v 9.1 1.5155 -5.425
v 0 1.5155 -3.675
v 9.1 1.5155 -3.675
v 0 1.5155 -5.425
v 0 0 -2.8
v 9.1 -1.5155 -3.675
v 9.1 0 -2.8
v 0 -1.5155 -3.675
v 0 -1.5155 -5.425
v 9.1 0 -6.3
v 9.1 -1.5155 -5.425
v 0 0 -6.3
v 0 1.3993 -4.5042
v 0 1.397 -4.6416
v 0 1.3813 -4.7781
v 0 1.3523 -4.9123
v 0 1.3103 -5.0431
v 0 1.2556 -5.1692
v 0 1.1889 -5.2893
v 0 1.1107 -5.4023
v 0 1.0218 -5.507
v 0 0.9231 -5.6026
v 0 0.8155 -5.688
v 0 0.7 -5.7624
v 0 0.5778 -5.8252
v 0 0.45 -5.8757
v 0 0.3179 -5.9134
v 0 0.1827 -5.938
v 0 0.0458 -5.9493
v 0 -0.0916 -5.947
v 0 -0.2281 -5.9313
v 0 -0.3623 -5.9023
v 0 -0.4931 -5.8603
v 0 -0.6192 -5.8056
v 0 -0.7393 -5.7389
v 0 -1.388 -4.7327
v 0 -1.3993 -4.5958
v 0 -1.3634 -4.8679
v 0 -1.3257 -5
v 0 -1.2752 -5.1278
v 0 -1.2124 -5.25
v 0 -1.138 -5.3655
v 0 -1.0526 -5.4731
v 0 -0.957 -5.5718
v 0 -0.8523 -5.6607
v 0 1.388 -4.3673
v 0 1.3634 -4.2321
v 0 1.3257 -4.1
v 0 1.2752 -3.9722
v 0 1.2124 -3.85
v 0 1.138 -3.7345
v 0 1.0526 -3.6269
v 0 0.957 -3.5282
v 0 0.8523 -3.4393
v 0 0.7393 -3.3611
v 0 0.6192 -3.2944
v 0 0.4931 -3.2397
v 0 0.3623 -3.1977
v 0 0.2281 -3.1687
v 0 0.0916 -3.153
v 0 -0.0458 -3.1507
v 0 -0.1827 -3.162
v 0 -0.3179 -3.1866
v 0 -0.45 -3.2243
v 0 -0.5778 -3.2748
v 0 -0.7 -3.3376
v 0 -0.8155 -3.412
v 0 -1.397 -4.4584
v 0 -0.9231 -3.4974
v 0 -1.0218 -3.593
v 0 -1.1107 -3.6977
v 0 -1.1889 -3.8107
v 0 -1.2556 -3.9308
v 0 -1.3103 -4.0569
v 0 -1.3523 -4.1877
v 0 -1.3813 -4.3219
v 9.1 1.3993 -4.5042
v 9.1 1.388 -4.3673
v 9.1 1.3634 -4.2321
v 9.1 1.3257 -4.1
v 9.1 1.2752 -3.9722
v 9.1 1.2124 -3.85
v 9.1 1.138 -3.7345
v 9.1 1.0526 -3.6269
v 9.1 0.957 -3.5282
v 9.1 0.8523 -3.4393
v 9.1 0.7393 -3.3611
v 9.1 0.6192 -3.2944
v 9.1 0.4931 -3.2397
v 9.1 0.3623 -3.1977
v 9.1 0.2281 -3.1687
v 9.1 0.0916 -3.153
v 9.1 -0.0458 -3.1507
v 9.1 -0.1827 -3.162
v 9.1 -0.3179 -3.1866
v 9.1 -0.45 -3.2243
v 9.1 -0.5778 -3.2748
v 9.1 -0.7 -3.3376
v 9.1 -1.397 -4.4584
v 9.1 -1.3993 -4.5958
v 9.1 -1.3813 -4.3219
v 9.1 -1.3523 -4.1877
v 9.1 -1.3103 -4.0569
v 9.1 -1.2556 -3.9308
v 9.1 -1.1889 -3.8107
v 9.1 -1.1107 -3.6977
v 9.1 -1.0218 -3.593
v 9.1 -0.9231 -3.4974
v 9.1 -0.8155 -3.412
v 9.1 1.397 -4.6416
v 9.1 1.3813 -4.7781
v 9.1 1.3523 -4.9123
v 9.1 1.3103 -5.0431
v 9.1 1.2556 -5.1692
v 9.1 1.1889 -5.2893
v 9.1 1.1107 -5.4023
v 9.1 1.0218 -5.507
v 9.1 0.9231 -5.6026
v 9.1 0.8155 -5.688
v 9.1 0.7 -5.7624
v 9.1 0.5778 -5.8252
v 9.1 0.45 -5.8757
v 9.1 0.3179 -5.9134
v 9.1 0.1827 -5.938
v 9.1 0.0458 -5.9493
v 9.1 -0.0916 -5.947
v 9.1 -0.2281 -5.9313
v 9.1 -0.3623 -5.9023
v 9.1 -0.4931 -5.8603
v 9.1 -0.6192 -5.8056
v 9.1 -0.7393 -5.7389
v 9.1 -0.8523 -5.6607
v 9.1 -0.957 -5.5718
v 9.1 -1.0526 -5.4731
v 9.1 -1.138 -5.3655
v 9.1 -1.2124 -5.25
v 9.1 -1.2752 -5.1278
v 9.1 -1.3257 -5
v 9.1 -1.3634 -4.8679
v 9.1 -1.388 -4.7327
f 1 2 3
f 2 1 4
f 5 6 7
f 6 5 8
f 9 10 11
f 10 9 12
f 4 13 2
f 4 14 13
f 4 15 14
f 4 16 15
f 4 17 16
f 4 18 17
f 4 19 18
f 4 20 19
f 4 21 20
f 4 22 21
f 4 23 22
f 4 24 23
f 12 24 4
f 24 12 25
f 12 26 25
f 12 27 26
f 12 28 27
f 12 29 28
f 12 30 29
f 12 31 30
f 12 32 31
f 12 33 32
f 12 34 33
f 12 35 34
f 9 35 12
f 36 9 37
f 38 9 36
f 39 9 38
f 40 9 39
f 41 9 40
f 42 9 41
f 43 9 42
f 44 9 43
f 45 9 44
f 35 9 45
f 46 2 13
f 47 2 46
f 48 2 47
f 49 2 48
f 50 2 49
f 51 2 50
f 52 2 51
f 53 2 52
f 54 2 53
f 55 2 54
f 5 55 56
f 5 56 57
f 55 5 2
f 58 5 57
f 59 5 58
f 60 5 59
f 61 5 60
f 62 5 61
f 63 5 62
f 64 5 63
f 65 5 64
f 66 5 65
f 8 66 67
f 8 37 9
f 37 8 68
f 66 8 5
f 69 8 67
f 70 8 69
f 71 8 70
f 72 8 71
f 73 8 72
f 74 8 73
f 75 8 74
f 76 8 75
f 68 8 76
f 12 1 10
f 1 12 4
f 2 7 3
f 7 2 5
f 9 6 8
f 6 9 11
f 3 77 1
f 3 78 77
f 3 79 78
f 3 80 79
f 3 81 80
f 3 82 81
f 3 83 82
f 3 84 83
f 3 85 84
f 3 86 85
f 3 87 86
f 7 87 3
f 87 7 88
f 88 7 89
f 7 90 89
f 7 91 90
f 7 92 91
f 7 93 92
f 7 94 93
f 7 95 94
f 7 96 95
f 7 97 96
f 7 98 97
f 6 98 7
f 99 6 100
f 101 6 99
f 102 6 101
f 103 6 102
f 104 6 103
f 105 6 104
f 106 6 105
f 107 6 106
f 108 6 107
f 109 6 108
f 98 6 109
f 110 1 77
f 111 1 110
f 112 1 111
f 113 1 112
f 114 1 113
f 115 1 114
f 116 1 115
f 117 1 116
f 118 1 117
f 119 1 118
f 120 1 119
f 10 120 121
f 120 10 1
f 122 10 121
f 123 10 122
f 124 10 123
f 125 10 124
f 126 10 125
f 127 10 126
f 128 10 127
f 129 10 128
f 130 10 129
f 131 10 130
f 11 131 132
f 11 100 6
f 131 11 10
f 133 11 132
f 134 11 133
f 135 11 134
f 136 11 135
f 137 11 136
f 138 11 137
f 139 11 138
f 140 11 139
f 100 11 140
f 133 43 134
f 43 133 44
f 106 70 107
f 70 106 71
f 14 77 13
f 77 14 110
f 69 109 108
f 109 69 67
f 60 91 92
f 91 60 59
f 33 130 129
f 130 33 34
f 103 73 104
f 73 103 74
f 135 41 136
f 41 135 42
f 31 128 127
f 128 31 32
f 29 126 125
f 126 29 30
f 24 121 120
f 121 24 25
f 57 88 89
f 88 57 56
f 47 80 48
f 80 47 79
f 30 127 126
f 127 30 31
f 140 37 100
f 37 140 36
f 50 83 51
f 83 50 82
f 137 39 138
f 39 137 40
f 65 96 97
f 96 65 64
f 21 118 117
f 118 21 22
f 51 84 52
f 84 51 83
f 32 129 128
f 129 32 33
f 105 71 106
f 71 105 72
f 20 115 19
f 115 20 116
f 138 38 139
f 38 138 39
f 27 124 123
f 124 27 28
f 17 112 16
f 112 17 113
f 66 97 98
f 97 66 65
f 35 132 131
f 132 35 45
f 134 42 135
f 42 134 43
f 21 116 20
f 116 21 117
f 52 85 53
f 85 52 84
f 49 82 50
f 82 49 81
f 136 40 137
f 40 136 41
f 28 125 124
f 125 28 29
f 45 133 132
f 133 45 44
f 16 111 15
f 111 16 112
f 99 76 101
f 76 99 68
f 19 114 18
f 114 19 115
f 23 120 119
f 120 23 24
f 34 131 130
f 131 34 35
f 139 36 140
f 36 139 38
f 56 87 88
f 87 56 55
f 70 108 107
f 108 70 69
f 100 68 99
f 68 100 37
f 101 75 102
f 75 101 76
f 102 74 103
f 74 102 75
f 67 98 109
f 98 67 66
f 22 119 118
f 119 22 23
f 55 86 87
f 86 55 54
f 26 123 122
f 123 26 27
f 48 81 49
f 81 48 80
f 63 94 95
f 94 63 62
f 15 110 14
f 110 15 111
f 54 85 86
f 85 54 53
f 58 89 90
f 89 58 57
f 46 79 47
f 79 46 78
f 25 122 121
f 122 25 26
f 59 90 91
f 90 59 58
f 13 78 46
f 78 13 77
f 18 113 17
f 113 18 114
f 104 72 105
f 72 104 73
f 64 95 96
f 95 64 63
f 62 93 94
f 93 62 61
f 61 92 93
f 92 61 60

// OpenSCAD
module c_shaped_segment() {
    $fn = 64;
    outer_radius = 1.75;
    inner_radius = outer_radius - 0.35;
    height = 9.1;
    angle = 120;

    difference() {
        // Outer faceted cylinder
        rotate([0, 90, 0])
        rotate([0, 0, -angle/2])
        cylinder(r=outer_radius, h=height, $fn=6);

        // Inner smooth cylinder
        rotate([0, 90, 0])
        rotate([0, 0, -angle/2])
        cylinder(r=inner_radius, h=height, $fn=64);
    }
}

translate([0, 0, -4.55])
c_shaped_segment();
